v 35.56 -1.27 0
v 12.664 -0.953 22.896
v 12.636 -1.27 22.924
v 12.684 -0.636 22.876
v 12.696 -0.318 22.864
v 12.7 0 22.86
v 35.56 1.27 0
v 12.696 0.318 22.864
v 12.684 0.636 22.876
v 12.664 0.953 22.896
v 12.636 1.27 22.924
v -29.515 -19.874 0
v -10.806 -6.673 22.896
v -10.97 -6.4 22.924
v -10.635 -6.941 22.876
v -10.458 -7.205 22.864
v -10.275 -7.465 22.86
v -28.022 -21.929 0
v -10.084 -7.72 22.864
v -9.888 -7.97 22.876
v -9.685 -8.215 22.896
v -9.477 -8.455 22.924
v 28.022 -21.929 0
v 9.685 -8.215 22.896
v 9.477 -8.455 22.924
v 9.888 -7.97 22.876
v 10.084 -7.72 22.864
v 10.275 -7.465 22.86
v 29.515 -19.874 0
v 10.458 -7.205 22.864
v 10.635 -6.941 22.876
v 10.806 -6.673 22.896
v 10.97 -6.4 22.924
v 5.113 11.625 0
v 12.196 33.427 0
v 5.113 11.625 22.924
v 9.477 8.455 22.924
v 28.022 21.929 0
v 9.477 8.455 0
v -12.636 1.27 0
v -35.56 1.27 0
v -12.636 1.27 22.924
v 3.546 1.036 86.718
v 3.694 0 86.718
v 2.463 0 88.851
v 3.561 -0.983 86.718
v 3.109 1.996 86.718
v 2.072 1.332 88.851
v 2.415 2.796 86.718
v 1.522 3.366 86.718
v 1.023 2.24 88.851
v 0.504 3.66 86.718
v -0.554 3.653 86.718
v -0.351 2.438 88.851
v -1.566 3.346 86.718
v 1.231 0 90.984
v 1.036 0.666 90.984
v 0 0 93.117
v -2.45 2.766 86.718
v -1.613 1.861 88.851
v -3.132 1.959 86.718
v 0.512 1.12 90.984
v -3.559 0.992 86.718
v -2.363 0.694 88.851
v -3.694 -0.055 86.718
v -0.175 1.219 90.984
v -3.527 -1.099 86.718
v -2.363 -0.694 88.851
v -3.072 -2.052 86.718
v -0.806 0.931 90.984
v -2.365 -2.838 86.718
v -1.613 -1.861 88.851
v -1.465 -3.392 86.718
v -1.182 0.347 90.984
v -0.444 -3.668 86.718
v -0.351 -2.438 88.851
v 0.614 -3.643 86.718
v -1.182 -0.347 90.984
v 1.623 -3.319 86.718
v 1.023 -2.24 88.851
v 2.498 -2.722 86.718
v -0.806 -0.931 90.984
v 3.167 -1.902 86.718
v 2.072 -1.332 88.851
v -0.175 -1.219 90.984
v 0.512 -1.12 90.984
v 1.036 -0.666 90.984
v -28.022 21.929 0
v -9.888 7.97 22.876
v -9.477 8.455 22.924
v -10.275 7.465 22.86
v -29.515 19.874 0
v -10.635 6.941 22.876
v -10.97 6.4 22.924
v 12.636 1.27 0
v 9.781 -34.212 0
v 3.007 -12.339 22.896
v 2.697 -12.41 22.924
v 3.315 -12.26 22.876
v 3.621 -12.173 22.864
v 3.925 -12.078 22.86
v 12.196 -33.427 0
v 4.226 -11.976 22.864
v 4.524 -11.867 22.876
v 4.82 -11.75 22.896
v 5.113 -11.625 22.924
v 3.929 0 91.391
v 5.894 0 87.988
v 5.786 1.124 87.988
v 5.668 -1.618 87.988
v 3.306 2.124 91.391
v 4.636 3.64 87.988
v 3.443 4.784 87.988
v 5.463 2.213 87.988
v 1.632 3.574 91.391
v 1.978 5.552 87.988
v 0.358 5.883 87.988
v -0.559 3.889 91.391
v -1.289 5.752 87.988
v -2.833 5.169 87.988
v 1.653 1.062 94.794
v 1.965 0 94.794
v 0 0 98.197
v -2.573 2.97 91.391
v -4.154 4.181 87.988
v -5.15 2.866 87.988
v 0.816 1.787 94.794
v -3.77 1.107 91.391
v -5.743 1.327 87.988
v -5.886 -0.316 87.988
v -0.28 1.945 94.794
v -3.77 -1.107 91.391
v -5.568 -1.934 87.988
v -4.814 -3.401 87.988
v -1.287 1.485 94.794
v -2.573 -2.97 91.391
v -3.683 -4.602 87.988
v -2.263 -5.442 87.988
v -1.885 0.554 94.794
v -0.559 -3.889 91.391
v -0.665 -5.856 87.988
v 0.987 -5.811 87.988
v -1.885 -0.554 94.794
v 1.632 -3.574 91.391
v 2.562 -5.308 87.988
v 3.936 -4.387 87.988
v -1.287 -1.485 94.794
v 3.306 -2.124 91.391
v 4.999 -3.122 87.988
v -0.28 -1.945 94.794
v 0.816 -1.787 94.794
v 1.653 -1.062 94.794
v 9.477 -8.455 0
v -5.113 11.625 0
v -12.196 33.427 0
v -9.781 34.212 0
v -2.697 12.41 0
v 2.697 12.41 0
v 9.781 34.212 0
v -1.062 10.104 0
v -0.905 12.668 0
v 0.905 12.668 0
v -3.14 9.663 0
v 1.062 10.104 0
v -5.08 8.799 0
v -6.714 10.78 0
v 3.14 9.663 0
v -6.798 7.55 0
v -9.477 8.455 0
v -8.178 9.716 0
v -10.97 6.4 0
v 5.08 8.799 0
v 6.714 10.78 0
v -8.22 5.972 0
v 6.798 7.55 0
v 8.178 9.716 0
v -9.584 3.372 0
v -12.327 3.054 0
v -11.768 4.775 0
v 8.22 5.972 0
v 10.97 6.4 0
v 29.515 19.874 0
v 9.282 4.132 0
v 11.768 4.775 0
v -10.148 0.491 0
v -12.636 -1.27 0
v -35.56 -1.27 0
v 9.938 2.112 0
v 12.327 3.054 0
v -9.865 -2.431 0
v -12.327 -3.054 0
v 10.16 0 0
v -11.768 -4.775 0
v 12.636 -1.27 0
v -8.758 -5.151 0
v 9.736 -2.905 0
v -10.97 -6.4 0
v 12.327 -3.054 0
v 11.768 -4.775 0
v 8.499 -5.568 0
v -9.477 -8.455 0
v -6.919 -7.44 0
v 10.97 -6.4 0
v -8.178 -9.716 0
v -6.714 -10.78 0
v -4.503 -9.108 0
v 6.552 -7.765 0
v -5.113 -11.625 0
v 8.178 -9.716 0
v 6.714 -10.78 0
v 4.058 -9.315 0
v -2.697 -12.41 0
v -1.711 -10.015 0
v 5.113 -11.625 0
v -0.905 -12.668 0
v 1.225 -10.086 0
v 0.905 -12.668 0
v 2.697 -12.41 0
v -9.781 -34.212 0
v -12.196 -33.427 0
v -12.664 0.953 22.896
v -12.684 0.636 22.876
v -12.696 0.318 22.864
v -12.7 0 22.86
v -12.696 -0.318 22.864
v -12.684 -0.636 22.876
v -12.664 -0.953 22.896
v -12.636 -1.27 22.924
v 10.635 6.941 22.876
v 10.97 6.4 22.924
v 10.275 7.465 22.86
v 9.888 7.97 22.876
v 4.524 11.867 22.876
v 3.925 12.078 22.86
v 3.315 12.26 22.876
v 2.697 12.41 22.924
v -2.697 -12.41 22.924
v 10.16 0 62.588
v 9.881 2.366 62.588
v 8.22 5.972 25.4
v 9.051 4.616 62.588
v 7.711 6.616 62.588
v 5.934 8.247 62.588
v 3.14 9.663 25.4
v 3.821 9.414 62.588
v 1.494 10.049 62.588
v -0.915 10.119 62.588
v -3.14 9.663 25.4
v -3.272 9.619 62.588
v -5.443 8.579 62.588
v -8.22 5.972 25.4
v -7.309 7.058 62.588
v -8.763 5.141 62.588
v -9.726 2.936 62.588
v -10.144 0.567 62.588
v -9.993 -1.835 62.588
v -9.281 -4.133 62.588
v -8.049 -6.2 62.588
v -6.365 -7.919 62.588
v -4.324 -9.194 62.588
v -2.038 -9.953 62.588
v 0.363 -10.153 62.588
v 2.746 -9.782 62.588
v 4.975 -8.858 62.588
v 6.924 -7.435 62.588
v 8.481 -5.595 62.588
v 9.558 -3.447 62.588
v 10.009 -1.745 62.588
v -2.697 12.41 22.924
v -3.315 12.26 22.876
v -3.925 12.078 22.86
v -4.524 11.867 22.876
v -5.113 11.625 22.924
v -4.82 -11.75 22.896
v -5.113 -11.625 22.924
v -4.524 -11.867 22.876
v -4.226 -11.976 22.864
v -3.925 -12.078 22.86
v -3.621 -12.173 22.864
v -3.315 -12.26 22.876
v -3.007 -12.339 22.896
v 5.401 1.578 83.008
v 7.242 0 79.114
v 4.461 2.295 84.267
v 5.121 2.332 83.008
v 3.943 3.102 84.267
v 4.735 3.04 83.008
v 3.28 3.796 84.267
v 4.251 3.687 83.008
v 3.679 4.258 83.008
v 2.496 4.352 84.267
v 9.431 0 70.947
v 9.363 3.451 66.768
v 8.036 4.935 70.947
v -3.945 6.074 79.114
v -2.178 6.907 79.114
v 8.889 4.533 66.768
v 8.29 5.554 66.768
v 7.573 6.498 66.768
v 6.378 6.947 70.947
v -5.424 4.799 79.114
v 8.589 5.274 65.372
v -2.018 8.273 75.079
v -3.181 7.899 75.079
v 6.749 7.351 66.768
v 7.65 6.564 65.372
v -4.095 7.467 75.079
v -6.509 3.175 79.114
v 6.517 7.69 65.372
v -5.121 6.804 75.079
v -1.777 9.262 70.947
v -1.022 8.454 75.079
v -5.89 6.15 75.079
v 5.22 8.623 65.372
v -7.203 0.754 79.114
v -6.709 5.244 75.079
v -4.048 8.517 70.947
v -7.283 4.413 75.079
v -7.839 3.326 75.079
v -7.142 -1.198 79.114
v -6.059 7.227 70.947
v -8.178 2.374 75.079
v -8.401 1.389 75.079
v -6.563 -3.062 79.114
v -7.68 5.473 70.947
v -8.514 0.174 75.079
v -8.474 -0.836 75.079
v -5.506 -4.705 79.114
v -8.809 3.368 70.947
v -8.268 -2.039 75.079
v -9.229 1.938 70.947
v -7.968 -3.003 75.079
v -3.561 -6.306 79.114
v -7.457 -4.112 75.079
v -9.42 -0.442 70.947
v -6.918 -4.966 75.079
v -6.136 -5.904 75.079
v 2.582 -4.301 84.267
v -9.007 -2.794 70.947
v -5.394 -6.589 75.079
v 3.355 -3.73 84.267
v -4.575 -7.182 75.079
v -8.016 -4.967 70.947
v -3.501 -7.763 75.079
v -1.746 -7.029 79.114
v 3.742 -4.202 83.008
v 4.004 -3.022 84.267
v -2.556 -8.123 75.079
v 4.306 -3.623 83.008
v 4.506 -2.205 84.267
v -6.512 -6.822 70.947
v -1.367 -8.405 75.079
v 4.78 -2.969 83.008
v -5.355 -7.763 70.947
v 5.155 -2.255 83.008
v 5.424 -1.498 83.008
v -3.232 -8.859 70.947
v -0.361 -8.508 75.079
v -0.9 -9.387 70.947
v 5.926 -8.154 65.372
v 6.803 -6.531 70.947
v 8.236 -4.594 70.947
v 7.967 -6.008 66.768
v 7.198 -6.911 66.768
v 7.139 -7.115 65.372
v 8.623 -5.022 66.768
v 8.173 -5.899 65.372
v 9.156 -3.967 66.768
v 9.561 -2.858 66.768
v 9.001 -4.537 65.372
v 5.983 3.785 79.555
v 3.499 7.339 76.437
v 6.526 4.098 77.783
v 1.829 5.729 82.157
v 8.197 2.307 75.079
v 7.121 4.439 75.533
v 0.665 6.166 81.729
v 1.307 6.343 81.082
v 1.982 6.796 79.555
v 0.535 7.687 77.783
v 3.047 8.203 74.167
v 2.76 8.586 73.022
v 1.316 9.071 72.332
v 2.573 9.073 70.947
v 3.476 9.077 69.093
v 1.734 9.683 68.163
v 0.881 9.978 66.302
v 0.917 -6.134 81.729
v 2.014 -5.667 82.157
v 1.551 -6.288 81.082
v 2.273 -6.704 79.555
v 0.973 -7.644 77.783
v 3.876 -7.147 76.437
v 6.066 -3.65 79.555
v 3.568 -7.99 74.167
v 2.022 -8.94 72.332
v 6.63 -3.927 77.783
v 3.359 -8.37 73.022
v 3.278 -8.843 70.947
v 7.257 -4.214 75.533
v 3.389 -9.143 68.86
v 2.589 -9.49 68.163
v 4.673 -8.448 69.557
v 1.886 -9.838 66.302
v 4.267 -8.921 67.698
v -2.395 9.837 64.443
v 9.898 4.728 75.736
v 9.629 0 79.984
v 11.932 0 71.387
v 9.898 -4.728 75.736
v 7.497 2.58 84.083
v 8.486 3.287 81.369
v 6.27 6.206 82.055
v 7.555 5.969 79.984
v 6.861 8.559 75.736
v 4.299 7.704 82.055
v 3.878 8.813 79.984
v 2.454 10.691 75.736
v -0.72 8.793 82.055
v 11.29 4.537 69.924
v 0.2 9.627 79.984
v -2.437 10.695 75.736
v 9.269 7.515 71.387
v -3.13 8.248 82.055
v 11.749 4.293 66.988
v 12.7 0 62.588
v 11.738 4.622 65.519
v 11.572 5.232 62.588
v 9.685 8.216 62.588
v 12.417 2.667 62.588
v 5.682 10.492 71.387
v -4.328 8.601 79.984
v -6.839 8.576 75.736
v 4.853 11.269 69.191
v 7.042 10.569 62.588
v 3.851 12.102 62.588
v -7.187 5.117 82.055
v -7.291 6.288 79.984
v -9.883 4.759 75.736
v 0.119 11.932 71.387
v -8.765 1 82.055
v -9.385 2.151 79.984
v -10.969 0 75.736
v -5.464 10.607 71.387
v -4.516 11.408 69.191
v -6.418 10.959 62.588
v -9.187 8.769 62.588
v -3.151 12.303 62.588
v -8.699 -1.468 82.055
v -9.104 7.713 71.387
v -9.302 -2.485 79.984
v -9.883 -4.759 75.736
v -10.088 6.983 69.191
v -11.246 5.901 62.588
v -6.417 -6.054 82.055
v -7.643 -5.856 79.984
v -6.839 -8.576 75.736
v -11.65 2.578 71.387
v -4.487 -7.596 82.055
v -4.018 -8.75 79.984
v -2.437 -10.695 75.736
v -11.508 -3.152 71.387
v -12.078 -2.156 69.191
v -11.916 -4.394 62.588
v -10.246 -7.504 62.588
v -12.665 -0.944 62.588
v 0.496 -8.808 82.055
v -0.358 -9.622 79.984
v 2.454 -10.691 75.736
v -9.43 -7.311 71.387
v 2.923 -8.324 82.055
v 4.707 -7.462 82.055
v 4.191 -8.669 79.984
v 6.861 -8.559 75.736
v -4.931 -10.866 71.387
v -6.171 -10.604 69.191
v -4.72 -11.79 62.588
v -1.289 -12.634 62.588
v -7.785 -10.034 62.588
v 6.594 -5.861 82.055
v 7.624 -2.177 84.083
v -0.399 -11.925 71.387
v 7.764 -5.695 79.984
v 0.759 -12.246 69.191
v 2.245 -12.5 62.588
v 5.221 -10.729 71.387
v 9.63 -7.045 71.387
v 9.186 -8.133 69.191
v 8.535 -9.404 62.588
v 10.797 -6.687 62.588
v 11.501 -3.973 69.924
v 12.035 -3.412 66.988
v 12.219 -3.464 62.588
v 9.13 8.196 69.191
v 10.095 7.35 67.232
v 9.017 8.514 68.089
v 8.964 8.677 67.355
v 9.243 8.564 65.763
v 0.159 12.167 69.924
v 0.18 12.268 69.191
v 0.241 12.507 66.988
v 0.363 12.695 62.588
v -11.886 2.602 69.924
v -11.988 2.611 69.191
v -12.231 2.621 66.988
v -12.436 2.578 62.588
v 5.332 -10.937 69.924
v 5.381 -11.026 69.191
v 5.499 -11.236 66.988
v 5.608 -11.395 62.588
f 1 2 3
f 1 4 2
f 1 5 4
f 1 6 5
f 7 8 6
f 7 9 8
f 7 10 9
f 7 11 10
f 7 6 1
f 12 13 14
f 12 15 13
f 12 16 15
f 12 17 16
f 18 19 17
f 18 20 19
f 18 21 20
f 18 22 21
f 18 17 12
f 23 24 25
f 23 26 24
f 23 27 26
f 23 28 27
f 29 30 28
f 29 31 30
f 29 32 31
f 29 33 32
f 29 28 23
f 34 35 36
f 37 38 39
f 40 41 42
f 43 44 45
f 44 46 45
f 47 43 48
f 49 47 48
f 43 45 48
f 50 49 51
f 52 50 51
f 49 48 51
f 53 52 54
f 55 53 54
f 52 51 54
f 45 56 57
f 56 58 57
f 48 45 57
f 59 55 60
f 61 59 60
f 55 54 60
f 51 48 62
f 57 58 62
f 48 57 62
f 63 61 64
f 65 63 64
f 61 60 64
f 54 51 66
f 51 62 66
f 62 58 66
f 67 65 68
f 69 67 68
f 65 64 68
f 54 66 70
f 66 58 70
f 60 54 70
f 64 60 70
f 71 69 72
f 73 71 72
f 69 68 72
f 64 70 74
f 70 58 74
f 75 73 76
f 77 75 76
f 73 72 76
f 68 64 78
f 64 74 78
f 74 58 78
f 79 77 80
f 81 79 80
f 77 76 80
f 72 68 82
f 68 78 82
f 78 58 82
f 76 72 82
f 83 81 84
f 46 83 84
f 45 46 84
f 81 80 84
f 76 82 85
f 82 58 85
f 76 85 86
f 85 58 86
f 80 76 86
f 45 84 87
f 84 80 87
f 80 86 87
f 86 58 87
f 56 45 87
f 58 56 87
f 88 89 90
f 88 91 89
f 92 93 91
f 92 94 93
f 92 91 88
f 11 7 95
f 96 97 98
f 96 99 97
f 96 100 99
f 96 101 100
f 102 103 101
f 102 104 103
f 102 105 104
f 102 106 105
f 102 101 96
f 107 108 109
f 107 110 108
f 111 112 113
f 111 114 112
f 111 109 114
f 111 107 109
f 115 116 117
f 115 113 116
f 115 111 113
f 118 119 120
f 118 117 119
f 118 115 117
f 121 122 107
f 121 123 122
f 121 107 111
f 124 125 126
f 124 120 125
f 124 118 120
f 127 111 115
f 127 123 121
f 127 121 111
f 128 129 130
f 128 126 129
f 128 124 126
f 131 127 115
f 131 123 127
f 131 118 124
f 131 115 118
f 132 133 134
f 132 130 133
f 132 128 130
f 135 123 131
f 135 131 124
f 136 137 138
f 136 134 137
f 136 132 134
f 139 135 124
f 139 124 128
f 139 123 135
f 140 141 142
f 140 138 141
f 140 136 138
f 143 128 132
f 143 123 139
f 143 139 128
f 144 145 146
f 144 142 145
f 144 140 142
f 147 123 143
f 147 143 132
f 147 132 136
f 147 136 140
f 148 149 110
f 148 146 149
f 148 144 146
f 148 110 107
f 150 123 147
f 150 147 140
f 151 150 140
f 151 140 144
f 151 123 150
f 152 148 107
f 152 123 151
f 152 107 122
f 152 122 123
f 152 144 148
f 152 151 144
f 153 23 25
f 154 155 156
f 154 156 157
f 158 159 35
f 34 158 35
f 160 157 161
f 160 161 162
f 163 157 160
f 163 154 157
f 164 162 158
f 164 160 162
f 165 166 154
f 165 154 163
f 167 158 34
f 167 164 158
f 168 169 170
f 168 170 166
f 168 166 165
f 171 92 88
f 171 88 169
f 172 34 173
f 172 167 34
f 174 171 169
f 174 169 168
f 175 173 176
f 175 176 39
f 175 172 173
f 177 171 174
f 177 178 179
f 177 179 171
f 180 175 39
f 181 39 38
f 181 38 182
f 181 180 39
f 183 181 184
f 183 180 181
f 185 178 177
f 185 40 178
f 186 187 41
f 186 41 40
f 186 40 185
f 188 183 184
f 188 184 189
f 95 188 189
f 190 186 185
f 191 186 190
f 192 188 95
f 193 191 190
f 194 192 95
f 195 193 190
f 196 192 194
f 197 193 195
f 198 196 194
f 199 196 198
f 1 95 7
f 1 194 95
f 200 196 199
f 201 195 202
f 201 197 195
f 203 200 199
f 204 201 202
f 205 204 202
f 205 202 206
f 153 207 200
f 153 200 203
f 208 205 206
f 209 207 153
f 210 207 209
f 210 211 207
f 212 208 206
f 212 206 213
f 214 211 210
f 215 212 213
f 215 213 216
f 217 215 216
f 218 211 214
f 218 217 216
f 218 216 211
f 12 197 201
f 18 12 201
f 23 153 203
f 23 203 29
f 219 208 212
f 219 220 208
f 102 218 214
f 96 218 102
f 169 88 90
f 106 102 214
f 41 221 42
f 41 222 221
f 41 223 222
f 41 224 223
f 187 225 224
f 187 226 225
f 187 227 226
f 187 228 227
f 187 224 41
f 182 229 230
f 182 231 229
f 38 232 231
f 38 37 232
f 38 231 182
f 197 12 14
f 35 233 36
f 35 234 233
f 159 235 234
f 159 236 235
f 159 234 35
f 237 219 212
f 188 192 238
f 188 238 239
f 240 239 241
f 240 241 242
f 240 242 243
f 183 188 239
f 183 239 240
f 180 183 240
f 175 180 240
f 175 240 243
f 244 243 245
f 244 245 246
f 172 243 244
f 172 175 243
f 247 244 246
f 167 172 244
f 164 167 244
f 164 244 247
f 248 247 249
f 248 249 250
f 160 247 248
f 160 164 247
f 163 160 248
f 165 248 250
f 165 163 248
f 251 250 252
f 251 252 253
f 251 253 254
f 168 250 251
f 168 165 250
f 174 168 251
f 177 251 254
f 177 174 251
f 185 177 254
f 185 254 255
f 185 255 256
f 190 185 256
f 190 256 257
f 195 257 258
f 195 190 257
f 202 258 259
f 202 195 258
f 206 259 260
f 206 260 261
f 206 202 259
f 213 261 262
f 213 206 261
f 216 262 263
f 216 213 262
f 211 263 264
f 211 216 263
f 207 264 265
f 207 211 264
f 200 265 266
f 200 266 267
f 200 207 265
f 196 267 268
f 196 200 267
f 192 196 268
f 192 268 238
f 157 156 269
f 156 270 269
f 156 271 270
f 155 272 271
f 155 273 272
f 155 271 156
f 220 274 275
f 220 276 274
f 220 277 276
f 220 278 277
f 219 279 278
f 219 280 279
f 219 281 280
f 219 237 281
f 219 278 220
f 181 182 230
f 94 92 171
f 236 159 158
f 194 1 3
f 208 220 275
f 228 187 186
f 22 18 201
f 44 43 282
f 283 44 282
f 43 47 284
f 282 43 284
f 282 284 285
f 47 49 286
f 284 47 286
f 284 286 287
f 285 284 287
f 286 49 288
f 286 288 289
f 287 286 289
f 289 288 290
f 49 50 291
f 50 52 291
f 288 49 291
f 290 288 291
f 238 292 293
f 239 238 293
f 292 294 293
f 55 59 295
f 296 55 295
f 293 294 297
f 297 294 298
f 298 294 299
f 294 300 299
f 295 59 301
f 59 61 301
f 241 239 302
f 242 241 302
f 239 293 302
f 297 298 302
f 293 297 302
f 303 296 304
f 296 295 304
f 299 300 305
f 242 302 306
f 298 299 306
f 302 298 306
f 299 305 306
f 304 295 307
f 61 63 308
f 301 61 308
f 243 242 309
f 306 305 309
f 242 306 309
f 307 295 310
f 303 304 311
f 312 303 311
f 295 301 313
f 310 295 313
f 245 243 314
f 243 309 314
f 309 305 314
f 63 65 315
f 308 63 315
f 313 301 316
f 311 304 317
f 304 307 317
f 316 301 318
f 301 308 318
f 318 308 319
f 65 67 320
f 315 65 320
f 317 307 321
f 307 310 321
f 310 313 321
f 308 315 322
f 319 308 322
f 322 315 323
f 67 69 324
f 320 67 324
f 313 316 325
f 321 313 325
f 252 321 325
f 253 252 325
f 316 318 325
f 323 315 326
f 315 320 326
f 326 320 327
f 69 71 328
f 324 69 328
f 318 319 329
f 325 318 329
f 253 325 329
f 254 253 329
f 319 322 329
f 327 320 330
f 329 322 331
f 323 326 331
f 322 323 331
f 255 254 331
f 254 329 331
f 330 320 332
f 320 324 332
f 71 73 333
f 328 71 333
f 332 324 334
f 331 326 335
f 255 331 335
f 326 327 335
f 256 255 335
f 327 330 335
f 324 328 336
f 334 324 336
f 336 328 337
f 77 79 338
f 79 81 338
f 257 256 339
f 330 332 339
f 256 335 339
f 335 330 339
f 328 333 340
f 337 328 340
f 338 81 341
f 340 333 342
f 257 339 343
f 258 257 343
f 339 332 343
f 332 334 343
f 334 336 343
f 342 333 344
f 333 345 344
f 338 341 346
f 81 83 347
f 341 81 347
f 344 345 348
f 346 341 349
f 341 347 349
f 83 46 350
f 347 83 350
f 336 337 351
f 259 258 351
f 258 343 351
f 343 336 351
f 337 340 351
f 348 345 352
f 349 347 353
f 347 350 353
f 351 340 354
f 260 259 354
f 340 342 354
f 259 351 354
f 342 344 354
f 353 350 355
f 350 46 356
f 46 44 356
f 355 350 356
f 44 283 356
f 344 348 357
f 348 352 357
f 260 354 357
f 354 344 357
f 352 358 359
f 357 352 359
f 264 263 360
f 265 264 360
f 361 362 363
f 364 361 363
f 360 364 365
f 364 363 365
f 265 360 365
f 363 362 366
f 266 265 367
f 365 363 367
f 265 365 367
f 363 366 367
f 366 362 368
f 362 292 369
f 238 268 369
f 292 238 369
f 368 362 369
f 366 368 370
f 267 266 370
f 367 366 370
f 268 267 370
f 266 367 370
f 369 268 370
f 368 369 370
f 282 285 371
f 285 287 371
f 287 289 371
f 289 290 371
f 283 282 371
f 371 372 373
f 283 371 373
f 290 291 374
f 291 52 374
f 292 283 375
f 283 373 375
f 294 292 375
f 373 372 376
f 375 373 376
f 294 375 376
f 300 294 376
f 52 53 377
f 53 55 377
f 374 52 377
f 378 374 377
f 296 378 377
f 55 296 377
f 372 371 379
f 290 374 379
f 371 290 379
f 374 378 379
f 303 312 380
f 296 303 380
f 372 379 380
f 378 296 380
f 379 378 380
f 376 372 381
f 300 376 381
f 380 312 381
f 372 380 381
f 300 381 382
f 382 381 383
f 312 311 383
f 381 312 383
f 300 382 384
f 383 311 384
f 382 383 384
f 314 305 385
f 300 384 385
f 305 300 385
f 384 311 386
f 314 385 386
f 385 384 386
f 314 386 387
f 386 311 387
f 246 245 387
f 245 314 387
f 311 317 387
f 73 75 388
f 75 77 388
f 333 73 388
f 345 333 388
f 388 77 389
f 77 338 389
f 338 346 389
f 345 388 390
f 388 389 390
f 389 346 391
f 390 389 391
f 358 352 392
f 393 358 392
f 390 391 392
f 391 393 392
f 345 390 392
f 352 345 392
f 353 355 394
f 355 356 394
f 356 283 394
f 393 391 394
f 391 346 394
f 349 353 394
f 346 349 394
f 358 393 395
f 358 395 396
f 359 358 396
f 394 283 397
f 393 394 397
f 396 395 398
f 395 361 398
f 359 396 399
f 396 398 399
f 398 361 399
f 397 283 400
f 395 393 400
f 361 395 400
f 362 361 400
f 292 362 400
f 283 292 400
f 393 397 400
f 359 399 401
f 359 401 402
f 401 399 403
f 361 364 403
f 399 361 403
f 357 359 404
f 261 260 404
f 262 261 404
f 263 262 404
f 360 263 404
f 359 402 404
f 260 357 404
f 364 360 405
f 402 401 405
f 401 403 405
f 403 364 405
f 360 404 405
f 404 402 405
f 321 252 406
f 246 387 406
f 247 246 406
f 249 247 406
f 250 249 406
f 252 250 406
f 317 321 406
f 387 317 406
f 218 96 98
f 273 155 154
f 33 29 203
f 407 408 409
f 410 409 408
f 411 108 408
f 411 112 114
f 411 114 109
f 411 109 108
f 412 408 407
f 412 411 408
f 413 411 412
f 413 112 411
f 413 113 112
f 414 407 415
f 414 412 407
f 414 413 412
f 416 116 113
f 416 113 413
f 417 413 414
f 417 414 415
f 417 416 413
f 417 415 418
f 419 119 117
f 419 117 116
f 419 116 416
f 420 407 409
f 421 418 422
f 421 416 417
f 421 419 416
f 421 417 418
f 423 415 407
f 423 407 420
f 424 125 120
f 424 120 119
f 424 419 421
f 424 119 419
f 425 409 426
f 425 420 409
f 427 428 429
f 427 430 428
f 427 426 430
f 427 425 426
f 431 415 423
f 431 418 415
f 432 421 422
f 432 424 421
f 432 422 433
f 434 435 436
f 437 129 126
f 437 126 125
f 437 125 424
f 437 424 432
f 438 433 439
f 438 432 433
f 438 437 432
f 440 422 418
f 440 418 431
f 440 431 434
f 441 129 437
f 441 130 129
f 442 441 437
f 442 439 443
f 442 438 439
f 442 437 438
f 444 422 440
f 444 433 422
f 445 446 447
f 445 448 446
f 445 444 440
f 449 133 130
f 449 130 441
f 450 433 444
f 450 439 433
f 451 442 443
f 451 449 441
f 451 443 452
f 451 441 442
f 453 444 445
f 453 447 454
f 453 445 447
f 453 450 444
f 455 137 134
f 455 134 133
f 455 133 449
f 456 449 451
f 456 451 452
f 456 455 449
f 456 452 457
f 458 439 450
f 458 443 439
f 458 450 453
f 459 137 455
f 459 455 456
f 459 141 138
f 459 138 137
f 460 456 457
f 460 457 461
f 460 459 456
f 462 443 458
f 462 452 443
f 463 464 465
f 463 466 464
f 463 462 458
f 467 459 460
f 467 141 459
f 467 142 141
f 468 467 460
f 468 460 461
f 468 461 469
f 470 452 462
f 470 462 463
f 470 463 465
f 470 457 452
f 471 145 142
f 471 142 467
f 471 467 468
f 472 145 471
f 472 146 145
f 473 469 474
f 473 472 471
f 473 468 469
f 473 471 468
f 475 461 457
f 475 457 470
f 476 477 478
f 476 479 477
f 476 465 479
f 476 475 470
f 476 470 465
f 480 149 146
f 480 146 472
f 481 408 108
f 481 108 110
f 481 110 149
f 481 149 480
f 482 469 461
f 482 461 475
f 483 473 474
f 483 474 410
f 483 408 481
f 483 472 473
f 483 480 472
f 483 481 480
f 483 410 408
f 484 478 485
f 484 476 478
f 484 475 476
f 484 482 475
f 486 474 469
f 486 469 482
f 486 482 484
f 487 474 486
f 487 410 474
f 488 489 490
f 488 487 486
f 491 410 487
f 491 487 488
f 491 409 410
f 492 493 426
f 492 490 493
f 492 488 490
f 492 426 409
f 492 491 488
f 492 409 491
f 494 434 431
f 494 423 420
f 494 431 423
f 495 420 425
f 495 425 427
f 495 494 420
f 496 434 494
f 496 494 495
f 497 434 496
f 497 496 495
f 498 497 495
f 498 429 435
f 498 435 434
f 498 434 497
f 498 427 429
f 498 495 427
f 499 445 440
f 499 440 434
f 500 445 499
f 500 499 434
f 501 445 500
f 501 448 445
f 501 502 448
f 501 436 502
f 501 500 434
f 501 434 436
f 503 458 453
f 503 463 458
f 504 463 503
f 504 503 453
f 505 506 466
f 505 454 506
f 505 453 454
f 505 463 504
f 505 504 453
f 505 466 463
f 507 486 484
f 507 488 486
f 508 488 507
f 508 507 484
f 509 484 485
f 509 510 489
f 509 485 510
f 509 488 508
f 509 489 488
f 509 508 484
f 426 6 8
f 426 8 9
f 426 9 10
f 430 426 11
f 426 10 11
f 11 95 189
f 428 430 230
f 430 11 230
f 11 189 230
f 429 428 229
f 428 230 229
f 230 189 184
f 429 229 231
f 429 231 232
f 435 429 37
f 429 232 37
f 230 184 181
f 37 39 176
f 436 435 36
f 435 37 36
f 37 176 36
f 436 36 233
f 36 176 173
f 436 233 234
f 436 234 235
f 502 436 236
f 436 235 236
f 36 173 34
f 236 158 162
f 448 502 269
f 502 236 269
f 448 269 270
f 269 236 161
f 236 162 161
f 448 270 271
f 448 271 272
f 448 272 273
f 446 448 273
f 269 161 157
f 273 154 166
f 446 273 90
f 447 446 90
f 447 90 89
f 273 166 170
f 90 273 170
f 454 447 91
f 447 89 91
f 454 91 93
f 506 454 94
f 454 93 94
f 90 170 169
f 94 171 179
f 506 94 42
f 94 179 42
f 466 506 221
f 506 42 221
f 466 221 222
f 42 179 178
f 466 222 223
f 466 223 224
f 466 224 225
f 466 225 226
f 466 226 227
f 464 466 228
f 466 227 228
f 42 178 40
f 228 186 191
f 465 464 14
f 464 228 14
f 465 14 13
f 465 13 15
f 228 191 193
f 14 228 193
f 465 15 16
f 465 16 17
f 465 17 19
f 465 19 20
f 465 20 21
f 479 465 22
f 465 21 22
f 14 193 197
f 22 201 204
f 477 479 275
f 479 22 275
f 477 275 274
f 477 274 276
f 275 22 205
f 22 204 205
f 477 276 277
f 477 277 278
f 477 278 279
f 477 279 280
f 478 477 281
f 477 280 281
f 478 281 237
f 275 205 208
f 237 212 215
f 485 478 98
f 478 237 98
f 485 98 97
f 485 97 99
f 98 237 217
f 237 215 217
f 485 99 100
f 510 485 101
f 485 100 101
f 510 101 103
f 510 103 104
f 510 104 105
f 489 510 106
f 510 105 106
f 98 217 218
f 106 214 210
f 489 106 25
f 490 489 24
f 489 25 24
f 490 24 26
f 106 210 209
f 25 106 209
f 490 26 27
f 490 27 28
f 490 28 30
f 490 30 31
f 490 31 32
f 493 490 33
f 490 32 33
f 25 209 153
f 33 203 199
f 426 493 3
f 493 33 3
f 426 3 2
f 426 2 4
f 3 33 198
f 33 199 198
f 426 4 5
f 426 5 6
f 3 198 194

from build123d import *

# Parameters (mm, degrees)
F0_R      = 12.7
F1_DEPTH  = 76.2
F1_FACE_R = 12.7
F2_DEPTH  = 25.4
F2_TAPER  = 30
F3_R      = 50.8
F4_T      = -2.54
F6_DEPTH  = 1.27
F7_COUNT  = 10


with BuildPart() as f1:
    # F0 (on Top) → F1 (new body)
    with BuildSketch(Plane.XY):
        Circle(F0_R)
    extrude(amount=F1_DEPTH)

    # F1_face (on face) → F2 (join)
    with BuildSketch(Plane.XY.offset(76.2)):
        Circle(F1_FACE_R)
    extrude(amount=F2_DEPTH, taper=F2_TAPER)

    # F3
    f3_edges = [f1.edges().sort_by_distance(p)[0] for p in [
        (-12.7, 0, 76.2),
    ]]
    fillet(f3_edges, radius=F3_R)

    # F4
    f4_openings = [f1.faces().sort_by_distance(p)[0] for p in [
        (0, 0, 0),
    ]]
    offset(amount=F4_T, openings=f4_openings)

    # F5 (on Front) → F6 (join, symmetric)
    with BuildSketch(Plane.XZ):
        Polygon((-35.56, 0), (-10.16, 0), (-10.16, 25.4), align=None)
    extrude(amount=F6_DEPTH, both=True)

    # F7: F1 ×10 about axis
    f7_axis = Axis((0, 0, 0), (0, 0, 1))


with BuildPart() as f1_1:
    add(f1.part)
    for i in range(1, F7_COUNT):
        add(f1.part.rotate(f7_axis, i * 360 / F7_COUNT))


solid = f1_1.part
